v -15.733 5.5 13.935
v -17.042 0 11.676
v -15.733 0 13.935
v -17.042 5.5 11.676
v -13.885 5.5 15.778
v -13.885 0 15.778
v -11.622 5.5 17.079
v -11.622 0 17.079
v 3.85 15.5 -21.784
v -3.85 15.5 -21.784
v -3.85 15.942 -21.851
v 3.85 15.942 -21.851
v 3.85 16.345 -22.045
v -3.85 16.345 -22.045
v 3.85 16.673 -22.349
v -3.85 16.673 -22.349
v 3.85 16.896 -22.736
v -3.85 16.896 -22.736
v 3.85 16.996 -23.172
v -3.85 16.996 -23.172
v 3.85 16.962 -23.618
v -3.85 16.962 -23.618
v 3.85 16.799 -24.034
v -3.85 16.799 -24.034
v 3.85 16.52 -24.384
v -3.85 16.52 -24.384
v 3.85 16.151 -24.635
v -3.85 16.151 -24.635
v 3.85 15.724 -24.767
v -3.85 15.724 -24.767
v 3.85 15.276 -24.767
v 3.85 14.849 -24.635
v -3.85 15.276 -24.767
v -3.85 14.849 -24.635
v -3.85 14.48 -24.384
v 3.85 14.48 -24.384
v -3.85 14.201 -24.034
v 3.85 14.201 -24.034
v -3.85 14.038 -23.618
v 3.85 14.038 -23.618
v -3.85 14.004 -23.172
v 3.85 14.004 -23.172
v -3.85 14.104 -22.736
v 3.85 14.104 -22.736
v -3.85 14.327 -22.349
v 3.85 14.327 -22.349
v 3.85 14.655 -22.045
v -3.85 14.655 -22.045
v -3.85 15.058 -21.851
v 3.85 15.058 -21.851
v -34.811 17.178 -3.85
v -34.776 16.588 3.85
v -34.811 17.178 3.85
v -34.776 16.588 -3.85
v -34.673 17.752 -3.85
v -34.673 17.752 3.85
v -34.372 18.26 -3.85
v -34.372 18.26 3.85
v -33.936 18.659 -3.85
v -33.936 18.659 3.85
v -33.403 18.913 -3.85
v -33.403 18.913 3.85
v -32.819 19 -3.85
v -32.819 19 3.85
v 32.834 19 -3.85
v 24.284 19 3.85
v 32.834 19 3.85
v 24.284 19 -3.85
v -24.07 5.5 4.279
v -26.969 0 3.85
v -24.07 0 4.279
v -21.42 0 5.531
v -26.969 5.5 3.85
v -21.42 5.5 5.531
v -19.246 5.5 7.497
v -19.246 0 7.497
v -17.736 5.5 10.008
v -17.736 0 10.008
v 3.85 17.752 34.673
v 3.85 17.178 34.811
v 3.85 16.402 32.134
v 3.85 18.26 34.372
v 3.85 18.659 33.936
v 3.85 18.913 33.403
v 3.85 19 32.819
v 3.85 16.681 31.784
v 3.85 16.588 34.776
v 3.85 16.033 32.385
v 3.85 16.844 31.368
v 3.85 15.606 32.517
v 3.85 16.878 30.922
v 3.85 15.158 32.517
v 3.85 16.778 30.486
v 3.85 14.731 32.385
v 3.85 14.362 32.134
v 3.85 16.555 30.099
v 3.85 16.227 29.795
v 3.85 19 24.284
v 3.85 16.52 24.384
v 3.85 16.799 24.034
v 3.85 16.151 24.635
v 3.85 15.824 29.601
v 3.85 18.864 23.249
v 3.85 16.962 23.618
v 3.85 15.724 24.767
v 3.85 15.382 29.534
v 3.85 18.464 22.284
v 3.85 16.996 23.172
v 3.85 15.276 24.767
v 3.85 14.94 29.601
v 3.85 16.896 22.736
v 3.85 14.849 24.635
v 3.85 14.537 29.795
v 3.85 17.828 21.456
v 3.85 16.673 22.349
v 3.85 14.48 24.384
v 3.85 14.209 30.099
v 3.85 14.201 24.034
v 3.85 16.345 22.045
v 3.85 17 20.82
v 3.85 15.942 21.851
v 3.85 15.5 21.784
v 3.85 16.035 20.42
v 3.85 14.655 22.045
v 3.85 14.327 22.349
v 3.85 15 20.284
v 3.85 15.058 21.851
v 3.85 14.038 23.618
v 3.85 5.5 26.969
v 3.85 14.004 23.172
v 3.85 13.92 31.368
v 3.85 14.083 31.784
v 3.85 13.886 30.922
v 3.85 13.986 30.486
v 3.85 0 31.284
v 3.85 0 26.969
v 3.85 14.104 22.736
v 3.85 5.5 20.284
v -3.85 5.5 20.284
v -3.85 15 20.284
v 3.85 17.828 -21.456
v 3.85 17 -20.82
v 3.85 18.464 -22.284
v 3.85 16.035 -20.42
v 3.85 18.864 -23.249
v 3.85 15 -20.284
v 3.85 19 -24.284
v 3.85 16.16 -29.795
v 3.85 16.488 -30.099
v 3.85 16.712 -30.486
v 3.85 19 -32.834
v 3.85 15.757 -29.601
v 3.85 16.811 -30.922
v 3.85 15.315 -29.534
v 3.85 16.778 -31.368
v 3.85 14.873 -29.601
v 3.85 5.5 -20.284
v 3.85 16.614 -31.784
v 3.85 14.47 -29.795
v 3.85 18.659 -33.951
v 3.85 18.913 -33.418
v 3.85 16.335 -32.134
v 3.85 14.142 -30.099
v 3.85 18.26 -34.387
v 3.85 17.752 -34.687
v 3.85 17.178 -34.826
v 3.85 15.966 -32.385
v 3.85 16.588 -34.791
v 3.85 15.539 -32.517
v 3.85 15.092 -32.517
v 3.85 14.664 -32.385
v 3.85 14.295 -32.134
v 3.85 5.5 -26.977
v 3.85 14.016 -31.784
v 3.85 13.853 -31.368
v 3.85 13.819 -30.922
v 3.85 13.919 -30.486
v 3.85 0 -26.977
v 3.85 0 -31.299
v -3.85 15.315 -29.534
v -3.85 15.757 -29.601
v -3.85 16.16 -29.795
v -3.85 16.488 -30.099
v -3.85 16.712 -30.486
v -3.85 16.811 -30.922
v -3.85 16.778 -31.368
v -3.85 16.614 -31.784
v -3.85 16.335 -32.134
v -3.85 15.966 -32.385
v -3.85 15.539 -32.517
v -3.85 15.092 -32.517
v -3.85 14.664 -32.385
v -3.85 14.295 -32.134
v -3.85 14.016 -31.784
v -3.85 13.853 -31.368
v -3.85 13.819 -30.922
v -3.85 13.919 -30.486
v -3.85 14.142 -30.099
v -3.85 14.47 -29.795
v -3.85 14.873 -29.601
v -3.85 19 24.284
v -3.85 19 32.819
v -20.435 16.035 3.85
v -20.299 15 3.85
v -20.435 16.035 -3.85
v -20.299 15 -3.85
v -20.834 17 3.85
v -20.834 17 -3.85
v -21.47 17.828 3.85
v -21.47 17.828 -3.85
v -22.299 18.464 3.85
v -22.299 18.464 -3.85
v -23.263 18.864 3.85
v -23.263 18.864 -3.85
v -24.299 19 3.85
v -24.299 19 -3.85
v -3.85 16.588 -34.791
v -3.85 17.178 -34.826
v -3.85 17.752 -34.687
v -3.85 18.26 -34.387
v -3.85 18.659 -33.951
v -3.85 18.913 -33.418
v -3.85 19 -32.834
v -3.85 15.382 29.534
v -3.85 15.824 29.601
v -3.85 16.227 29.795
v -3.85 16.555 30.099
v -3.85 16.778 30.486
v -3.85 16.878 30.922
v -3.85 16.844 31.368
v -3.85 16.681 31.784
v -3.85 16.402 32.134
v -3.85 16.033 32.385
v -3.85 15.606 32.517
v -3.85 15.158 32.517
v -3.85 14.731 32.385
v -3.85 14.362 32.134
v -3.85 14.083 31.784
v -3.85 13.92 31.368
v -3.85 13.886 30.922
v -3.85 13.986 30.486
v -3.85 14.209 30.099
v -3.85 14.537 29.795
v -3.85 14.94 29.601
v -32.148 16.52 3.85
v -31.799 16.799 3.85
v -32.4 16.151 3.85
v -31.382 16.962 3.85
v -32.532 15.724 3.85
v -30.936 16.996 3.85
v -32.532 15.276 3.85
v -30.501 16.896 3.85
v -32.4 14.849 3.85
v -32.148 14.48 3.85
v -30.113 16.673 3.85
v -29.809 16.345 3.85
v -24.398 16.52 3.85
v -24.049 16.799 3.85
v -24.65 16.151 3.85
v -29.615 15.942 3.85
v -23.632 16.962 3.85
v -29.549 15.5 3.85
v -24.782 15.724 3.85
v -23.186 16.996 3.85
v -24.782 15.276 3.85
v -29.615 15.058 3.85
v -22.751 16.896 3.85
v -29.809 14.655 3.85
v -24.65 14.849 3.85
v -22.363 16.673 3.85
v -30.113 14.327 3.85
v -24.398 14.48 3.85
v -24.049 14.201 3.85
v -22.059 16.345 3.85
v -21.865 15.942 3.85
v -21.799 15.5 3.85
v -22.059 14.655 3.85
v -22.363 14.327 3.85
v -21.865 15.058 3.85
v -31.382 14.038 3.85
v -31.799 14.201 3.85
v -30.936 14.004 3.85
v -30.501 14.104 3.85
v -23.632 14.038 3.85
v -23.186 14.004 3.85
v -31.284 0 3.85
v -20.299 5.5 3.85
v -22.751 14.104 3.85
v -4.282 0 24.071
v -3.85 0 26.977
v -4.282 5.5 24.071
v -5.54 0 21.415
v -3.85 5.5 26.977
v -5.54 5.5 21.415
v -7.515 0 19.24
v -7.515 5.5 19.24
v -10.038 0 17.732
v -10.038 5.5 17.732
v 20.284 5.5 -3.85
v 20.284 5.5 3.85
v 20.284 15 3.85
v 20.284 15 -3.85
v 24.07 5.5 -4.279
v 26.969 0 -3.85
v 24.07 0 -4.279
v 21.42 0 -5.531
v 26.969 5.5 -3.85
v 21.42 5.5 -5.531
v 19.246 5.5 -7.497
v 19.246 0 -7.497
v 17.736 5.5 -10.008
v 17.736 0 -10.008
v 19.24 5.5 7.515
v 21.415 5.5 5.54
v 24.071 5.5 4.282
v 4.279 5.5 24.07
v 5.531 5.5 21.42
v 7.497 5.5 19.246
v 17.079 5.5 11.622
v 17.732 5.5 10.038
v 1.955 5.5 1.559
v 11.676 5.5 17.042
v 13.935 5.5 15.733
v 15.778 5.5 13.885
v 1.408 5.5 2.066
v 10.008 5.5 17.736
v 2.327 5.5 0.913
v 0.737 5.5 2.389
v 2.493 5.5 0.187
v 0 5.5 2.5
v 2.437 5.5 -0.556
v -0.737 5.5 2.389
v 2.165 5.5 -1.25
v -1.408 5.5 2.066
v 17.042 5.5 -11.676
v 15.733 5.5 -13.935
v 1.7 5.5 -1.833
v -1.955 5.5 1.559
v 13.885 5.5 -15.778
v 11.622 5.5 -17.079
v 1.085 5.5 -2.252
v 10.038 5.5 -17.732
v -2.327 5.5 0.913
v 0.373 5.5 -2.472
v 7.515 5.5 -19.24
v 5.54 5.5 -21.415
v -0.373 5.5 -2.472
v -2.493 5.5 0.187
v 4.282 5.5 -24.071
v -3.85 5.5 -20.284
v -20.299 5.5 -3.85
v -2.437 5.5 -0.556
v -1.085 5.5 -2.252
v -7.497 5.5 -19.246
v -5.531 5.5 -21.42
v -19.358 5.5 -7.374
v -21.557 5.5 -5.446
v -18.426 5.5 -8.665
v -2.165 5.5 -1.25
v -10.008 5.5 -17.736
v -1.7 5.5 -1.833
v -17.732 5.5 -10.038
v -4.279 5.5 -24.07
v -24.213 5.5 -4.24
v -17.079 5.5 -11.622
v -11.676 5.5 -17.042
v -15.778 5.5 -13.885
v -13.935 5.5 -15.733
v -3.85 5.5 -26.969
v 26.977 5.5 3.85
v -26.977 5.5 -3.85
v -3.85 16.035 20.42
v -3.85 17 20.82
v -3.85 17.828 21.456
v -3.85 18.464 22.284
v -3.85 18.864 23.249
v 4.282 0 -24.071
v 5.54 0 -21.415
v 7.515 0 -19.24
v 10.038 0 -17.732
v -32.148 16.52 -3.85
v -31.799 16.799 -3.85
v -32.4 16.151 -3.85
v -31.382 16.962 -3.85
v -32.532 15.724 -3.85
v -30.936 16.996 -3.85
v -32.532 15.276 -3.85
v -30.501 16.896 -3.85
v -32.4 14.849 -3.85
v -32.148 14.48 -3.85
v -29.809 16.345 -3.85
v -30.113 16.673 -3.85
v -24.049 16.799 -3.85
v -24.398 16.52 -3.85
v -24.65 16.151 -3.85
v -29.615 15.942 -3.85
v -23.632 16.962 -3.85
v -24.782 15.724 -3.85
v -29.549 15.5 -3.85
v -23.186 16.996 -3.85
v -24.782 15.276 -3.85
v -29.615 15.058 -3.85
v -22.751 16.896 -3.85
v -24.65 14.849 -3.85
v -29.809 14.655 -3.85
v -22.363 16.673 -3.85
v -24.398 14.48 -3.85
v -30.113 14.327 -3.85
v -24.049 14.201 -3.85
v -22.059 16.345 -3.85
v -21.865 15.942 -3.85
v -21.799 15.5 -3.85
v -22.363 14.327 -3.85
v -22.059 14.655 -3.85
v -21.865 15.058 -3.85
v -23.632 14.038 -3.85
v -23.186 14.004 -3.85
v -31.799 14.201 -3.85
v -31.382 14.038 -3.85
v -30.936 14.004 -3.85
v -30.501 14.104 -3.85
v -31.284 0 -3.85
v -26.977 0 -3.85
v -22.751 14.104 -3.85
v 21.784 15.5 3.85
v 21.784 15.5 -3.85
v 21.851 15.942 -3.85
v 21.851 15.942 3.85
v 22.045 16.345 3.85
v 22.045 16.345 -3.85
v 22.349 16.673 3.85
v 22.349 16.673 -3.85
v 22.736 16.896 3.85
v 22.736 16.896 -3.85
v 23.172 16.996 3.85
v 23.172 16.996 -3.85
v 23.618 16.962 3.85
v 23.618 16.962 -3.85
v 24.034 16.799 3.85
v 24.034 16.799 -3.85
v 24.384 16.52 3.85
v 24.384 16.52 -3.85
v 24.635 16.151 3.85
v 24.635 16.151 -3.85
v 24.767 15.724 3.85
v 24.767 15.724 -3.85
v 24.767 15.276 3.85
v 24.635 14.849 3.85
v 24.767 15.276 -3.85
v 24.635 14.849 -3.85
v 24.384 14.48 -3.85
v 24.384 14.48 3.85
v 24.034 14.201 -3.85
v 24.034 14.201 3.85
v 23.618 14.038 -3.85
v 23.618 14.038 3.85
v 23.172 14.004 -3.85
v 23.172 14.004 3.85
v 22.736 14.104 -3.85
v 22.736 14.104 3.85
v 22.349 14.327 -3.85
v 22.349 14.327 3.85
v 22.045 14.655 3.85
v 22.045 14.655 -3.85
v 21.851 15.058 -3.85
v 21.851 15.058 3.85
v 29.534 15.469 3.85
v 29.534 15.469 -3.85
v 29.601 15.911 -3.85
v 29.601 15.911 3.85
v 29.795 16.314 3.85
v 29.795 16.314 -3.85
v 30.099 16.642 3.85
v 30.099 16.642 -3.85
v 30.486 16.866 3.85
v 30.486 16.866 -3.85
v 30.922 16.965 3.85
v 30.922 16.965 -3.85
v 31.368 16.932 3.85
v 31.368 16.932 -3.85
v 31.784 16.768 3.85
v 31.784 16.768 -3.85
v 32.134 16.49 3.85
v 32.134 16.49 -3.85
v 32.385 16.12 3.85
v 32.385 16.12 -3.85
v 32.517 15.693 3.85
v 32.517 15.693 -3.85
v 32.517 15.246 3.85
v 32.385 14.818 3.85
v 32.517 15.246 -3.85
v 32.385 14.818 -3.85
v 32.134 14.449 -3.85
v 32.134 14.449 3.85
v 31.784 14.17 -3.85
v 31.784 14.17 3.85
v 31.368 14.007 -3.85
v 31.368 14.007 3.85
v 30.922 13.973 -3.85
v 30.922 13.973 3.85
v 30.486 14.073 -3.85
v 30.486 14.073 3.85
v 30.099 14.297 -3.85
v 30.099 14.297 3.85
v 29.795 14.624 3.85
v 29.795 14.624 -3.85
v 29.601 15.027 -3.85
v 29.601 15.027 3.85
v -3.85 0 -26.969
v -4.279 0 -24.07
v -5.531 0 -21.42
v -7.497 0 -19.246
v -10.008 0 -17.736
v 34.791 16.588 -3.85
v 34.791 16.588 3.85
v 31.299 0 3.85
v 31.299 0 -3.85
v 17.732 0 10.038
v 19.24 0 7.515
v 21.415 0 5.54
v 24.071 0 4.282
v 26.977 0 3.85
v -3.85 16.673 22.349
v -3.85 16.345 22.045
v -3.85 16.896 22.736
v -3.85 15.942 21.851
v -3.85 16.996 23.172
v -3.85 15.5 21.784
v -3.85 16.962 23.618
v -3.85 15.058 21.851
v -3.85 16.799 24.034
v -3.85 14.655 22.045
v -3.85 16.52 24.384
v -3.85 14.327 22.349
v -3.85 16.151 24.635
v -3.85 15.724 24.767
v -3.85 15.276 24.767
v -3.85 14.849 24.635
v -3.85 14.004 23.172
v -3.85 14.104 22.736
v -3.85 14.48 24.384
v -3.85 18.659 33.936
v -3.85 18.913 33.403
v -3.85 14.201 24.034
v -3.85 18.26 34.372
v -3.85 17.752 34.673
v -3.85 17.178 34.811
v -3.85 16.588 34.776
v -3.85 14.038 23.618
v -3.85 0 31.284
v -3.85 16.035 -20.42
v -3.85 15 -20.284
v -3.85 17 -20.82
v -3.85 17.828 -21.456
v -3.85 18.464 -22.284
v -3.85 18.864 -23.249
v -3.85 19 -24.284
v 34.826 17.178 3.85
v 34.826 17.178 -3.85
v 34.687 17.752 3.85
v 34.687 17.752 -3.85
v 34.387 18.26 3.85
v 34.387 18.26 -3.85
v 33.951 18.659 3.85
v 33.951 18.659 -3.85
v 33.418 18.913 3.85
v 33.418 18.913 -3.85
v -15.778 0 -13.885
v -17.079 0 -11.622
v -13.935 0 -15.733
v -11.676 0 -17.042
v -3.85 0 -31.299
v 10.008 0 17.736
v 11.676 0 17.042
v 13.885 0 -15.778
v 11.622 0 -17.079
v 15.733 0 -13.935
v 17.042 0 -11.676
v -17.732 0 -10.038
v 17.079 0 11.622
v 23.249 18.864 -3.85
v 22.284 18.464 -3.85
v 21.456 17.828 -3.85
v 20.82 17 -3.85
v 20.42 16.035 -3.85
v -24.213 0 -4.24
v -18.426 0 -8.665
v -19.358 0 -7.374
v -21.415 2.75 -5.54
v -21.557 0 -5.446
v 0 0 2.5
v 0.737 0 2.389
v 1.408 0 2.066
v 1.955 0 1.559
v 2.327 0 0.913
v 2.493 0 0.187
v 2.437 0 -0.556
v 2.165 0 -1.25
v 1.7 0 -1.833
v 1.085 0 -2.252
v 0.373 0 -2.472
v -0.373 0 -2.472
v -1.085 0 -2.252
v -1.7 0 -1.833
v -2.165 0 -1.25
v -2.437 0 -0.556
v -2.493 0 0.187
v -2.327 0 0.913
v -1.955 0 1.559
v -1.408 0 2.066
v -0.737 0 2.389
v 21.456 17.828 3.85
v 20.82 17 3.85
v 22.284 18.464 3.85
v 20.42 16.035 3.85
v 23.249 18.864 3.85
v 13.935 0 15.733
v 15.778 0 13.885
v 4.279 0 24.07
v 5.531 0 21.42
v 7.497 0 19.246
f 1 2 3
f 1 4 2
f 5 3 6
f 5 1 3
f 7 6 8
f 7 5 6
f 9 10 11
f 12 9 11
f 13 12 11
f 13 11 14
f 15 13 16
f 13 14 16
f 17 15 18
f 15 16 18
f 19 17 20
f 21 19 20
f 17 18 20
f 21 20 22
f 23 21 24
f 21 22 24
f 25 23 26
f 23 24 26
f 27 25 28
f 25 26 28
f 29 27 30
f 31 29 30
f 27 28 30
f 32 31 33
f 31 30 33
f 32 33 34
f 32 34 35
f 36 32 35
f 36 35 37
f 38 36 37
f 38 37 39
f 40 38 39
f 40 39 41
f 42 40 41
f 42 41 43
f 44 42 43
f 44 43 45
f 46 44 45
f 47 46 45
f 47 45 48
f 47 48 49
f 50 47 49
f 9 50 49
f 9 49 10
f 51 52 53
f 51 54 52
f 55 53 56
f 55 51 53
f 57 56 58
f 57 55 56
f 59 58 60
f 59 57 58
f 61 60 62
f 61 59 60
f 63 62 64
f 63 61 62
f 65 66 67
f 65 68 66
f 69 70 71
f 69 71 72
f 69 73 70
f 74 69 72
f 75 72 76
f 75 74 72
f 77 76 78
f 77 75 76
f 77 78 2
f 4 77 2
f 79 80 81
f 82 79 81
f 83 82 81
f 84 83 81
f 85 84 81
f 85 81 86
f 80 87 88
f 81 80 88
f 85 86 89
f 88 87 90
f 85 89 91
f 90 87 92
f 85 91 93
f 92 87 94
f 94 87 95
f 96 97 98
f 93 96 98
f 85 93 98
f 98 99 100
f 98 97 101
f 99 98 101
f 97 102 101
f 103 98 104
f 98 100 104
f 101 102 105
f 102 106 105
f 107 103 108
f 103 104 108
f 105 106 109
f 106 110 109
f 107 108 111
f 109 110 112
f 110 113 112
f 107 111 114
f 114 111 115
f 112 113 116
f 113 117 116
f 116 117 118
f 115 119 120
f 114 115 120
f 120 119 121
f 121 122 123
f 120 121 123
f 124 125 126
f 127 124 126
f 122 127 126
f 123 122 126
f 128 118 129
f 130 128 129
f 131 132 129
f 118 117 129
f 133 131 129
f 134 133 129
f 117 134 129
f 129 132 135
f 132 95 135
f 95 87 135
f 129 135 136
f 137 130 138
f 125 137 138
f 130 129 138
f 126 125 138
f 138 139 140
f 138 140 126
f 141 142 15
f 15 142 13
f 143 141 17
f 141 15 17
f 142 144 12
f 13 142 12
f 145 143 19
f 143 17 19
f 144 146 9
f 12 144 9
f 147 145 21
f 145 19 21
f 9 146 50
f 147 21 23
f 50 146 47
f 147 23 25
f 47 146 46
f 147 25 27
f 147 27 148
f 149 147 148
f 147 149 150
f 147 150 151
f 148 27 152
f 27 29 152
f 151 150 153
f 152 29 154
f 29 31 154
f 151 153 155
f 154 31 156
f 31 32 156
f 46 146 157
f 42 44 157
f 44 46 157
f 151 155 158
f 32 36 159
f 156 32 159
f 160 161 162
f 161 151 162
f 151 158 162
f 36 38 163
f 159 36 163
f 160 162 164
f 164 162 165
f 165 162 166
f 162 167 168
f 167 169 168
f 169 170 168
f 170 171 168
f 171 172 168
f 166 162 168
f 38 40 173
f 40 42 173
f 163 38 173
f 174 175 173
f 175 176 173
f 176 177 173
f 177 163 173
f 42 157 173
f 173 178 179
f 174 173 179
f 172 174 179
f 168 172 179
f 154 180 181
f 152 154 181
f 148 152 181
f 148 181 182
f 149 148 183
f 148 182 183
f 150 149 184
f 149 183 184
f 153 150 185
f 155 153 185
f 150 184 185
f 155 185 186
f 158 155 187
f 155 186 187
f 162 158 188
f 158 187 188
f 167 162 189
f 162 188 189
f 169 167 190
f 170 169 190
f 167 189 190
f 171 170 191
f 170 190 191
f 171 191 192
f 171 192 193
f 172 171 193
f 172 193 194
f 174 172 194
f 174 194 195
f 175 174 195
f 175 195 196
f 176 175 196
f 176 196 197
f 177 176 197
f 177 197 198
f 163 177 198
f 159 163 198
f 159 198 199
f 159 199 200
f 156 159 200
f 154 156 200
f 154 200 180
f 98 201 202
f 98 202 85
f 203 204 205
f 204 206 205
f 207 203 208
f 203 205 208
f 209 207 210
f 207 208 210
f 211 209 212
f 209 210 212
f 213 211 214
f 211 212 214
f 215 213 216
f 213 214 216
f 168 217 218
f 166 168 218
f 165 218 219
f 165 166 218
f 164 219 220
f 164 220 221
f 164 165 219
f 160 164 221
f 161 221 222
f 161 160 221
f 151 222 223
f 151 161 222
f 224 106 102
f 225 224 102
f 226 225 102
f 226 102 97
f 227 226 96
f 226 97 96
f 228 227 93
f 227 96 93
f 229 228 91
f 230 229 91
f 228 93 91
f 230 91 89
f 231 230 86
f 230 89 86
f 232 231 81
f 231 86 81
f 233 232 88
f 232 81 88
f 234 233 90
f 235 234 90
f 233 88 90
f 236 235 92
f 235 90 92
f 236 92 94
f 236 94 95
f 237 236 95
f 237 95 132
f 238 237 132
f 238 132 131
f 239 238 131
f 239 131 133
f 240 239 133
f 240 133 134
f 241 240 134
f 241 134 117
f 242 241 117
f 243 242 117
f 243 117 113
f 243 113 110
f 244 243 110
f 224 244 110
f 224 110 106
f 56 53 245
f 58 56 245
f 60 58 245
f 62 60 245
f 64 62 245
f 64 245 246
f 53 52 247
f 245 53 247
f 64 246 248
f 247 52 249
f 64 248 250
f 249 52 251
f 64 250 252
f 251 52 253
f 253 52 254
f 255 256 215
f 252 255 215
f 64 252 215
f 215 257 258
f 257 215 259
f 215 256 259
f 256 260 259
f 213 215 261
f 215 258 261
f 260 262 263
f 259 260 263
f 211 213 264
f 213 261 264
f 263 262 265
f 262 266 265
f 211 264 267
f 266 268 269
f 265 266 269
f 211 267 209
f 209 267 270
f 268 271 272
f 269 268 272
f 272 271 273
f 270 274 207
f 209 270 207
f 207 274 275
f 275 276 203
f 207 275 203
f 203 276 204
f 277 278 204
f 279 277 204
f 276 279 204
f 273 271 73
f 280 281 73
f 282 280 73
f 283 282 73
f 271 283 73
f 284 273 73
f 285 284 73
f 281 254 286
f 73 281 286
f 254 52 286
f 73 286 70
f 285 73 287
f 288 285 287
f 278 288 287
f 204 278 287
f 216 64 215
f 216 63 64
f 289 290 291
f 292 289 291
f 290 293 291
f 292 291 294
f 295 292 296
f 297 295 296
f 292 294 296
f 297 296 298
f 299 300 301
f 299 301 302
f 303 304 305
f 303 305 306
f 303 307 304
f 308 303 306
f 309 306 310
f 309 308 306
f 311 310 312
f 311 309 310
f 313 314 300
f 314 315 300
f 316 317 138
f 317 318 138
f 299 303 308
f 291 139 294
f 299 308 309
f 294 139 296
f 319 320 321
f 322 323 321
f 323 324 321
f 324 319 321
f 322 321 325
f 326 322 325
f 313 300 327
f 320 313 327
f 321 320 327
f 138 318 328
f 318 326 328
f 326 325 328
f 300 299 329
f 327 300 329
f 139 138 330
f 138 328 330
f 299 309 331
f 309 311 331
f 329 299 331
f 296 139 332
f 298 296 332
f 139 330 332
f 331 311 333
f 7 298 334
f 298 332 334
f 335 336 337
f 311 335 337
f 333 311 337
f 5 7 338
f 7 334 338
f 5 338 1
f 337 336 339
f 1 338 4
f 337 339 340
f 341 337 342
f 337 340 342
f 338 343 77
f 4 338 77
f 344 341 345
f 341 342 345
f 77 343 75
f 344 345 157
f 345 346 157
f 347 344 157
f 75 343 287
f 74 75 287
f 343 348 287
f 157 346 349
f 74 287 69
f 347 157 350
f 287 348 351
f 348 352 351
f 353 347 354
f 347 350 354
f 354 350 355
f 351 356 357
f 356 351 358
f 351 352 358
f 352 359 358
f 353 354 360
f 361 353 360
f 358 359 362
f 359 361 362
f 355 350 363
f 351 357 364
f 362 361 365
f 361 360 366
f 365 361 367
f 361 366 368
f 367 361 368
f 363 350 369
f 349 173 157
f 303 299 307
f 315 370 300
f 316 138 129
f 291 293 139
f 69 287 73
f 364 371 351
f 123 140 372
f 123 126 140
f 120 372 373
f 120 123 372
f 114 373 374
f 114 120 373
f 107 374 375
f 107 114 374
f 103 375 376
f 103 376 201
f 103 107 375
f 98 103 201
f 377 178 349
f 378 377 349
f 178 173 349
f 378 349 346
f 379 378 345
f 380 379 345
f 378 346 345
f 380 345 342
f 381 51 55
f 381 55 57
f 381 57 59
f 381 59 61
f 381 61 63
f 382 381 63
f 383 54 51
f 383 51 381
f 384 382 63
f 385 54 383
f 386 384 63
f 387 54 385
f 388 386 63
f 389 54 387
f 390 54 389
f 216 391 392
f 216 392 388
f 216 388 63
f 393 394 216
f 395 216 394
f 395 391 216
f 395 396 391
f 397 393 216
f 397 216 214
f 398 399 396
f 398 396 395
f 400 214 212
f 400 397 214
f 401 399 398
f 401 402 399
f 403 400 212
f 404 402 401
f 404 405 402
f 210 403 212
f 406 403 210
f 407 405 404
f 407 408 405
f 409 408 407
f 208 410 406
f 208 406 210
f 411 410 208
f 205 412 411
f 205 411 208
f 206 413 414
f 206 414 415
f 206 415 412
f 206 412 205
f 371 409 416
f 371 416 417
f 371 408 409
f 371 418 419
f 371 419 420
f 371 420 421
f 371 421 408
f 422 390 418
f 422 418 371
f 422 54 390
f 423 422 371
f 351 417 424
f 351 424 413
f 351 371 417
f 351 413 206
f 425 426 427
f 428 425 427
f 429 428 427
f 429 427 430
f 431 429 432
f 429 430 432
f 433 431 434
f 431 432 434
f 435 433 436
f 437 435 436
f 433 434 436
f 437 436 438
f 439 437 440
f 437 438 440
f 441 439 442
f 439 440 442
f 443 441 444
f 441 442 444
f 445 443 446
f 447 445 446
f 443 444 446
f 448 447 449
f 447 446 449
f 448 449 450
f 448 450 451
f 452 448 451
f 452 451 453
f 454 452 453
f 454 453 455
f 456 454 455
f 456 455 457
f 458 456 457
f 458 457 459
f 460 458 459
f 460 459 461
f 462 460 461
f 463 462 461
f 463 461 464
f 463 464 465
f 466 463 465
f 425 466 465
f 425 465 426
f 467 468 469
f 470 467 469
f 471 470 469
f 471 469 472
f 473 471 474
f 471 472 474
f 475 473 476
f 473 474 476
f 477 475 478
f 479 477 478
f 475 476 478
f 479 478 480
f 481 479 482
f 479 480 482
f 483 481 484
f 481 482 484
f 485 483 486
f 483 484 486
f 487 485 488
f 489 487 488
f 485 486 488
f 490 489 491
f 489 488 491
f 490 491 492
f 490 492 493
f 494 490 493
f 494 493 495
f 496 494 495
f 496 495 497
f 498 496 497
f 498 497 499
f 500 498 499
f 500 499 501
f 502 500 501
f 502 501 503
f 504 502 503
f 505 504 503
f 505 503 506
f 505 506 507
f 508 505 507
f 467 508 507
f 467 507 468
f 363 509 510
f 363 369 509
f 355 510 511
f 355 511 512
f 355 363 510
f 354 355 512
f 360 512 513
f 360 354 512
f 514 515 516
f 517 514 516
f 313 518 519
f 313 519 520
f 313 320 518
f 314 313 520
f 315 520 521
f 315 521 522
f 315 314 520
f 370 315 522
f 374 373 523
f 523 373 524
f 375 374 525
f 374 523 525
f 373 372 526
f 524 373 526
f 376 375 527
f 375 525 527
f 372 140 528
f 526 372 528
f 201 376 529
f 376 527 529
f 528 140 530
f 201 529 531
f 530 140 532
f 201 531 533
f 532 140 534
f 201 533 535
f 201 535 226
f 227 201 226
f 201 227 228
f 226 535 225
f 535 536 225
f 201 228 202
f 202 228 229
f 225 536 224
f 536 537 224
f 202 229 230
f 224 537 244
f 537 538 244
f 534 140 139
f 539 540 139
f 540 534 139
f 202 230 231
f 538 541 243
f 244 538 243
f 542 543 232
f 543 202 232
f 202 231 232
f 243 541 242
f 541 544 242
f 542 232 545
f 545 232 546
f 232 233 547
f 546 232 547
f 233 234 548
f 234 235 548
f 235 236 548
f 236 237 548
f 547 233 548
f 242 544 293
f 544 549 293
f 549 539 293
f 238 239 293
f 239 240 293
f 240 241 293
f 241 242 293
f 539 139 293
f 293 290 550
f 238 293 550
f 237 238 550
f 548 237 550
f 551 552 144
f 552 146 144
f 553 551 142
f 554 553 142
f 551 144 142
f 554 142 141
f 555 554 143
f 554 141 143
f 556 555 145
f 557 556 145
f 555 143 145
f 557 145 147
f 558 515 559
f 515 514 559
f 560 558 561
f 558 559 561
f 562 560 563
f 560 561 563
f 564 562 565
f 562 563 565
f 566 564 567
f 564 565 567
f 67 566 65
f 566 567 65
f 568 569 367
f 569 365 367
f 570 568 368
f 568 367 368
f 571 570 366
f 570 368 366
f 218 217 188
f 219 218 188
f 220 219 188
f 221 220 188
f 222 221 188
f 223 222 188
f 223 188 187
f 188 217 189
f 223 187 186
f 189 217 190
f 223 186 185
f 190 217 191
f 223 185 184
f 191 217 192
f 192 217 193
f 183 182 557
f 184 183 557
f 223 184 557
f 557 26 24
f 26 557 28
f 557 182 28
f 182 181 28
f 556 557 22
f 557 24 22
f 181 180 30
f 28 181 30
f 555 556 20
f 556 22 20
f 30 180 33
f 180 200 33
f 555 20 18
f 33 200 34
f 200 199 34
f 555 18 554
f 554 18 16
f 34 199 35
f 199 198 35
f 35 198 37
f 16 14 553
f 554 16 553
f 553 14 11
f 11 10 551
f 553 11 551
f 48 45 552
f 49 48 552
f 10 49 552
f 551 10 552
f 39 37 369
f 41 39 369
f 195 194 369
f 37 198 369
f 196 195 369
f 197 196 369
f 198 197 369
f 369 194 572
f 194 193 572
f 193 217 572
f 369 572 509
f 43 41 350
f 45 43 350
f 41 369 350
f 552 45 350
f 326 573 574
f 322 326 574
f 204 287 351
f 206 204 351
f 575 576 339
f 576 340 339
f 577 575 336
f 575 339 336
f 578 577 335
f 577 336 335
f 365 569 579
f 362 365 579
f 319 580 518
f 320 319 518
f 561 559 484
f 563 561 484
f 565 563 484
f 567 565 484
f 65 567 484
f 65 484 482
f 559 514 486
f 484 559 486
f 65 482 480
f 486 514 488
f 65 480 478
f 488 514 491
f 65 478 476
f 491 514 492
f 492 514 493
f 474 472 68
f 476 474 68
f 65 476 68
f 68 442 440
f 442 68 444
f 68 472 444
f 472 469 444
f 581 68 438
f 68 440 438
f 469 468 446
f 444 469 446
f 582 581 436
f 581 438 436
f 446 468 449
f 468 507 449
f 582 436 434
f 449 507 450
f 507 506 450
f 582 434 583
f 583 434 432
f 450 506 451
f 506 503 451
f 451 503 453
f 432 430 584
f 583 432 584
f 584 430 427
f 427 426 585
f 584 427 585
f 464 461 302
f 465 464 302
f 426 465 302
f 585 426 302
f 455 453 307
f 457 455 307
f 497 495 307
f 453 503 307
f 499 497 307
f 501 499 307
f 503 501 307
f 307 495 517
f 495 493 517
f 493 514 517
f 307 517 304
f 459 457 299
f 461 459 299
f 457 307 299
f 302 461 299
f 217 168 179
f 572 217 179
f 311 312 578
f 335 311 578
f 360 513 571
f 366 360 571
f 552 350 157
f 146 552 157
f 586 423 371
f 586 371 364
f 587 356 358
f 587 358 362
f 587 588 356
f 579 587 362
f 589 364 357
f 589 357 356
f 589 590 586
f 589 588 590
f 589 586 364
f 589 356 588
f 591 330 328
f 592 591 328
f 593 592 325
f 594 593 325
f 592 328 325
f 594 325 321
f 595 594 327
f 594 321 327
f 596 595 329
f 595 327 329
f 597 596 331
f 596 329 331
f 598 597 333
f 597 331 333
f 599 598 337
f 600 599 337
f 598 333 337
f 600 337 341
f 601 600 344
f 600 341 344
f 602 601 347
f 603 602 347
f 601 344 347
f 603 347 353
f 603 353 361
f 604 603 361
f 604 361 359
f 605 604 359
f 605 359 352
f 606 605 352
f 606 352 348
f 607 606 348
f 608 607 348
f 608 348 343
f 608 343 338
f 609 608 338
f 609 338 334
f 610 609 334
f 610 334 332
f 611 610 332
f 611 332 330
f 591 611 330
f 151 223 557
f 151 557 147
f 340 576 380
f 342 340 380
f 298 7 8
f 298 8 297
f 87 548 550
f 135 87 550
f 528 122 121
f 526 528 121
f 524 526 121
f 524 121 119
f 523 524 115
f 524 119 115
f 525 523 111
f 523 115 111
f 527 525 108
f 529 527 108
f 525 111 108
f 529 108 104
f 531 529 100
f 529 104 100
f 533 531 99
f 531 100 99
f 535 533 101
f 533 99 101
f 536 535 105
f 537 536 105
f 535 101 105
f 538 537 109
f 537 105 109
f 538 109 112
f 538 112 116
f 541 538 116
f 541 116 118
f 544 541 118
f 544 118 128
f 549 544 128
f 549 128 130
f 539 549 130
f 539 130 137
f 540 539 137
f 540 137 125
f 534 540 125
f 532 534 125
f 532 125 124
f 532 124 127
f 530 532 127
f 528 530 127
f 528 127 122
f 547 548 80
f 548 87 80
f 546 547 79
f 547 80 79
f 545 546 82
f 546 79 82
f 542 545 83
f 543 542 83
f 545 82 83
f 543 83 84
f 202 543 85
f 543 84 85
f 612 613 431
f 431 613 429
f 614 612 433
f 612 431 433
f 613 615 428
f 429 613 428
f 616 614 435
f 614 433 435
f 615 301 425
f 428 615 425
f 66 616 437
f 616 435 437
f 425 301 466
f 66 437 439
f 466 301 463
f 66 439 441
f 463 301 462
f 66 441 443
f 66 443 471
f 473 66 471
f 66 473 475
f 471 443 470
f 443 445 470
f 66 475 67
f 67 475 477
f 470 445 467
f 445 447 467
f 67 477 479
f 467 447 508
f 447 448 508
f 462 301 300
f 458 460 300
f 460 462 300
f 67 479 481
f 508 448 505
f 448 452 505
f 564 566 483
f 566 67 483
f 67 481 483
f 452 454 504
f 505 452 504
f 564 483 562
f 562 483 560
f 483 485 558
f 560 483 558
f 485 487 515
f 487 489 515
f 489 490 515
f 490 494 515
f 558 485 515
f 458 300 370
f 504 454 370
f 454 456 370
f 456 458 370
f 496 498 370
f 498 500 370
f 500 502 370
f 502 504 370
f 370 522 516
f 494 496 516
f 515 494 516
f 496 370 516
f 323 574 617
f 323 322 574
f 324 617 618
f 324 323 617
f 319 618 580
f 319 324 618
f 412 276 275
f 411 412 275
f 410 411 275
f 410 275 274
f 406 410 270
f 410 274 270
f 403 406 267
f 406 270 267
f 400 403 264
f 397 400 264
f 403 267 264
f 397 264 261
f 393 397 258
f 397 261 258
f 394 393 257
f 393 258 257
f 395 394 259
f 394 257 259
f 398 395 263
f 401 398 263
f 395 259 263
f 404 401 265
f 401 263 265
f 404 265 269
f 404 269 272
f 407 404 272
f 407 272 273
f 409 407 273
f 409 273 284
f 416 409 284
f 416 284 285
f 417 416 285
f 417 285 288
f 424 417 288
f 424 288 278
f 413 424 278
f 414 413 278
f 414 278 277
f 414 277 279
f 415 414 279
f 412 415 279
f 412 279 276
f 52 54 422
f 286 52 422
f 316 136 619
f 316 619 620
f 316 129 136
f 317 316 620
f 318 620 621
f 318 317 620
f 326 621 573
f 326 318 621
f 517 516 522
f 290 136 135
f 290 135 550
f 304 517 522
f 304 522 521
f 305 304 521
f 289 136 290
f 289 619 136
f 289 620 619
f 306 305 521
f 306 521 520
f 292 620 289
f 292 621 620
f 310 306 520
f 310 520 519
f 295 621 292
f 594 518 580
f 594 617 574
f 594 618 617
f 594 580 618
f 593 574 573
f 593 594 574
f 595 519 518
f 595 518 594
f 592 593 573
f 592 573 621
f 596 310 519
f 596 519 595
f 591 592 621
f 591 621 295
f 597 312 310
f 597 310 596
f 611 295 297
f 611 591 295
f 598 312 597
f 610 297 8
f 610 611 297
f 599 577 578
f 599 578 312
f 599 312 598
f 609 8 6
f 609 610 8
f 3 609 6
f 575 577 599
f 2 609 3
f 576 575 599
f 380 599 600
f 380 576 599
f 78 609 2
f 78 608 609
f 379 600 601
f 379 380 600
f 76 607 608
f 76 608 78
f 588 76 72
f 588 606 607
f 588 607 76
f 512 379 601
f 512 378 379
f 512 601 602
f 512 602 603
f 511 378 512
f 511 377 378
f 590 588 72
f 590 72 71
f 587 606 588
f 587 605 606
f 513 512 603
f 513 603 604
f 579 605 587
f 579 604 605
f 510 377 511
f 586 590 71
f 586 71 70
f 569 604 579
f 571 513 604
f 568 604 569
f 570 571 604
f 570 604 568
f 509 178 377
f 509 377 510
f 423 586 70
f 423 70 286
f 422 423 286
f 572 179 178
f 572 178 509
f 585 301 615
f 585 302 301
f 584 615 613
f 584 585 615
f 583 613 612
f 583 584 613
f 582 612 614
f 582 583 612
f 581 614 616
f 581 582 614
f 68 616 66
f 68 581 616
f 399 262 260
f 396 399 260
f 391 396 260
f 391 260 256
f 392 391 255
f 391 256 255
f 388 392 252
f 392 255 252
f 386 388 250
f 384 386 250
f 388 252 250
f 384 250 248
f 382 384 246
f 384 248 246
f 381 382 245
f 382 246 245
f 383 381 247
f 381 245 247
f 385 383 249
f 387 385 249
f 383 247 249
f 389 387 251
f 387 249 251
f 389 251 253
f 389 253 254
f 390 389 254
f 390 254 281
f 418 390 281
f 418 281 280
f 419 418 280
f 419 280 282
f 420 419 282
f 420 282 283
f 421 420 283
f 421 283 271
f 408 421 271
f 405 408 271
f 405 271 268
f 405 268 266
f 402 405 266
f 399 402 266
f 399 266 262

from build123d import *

# Parameters (mm, degrees)
BOSS_EXTRUSION_DEPTH     = 5.5
SCHIZZO2_W               = 14.985516936
SCHIZZO2_H               = 7.7
SCHIZZO2_W_2             = 7.7
SCHIZZO2_H_2             = 15.014483064
SCHIZZO2_W_3             = 15.014483064
SCHIZZO2_H_3             = 15
EXTERNAL_EXTRUSION_DEPTH = 13.5
SCHIZZO3_R               = 2.5
CETRAL_HOLE_DEPTH        = 52.71287379
TAGLIO_ESTRUSIONE2_DEPTH = 57.032066134
TAGLIO_ESTRUSIONE3_DEPTH = 57.021948056
TAGLIO_ESTRUSIONE4_DEPTH = 57.021948056
TAGLIO_ESTRUSIONE5_DEPTH = 57.032066134
FORO_PER_VITE_M4_1_D     = 3
FORO_PER_VITE_M4_2_D     = 3
FORO_PER_VITE_M4_3_D     = 3
FORO_PER_VITE_M4_4_D     = 3
RACCORDO1_R              = 4
RACCORDO2_R              = 4
RACCORDO3_R              = 4
RACCORDO4_R              = 4
RACCORDO5_R              = 2
RACCORDO6_R              = 2
RACCORDO7_R              = 2
RACCORDO8_R              = 2
RACCORDO9_R              = 10
RACCORDO17_R             = 10
RACCORDO18_R             = 10
RACCORDO19_R             = 10
RACCORDO20_R             = 10
RACCORDO21_R             = 10
RACCORDO22_DEPTH         = 5.5
RACCORDO23_R             = 10
RACCORDO24_R             = 10
RACCORDO25_R             = 10


with BuildPart() as part:
    # Schizzo1 → Boss extrusion (new body)
    with BuildSketch(Plane(origin=(0, 0, 0), x_dir=(1, 0, 0), z_dir=(0, 1, 0))):
        Polygon((-3.85, -20.28403897), (-3.85, -35.28403897), (3.85, -35.28403897), (3.85, -20.298522034), (15.500302101, -15.451094793), (20.28403897, -3.85), (35.298522034, -3.85), (35.298522034, 3.85), (20.298522034, 3.85), (15.451094793, 15.500302101), (3.85, 20.28403897), (3.85, 35.298522034), (-3.85, 35.298522034), (-3.85, 20.298522034), (-15.500302101, 15.451094793), (-20.28403897, 3.85), (-35.28403897, 3.85), (-35.28403897, -3.85), (-20.298522034, -3.85), (-15.451094793, -15.500302101), align=None)
    extrude(amount=BOSS_EXTRUSION_DEPTH)

    # Schizzo2 → external extrusion (add)
    with BuildSketch(Plane(origin=(0, 5.5, 0), x_dir=(1, 0, 0), z_dir=(0, 1, 0))):
        with Locations((-27.791280502, 0)):
            Rectangle(SCHIZZO2_W, SCHIZZO2_H)
        with Locations((0, 27.791280502)):
            Rectangle(SCHIZZO2_W_2, SCHIZZO2_H_2)
        with Locations((27.791280502, 0)):
            Rectangle(SCHIZZO2_W_3, SCHIZZO2_H)
        with Locations((0, -27.78403897)):
            Rectangle(SCHIZZO2_W_2, SCHIZZO2_H_3)
    extrude(amount=EXTERNAL_EXTRUSION_DEPTH)

    # Schizzo3 → cetral hole (cut, through all)
    with BuildSketch(Plane(origin=(0, 5.5, 0), x_dir=(1, 0, 0), z_dir=(0, 1, 0))):
        with Locations(Location((0, 0, 0), (0, 0, 270))):
            Circle(SCHIZZO3_R)
    extrude(amount=-CETRAL_HOLE_DEPTH, mode=Mode.SUBTRACT)

    # Schizzo4 → Taglio-Estrusione2 (cut, through all)
    with BuildSketch(Plane.XY.offset(3.85)):
        Polygon((35.298522034, 0), (35.298522034, 19), (31.298522034, 0), align=None)
    extrude(amount=-TAGLIO_ESTRUSIONE2_DEPTH, mode=Mode.SUBTRACT)

    # Schizzo5 → Taglio-Estrusione3 (cut, through all)
    with BuildSketch(Plane(origin=(3.85, 0, 0), x_dir=(0, 0, -1), z_dir=(1, 0, 0))):
        Polygon((35.298522034, 0), (35.298522034, 19), (31.298522034, 0), align=None)
    extrude(amount=-TAGLIO_ESTRUSIONE3_DEPTH, mode=Mode.SUBTRACT)

    # Schizzo8 → Taglio-Estrusione4 (cut, through all)
    with BuildSketch(Plane(origin=(0, 0, -3.85), x_dir=(-1, 0, 0), z_dir=(0, 0, -1))):
        Polygon((35.28403897, 0), (35.28403897, 19), (31.28403897, 0), align=None)
    extrude(amount=-TAGLIO_ESTRUSIONE4_DEPTH, mode=Mode.SUBTRACT)

    # Schizzo9 → Taglio-Estrusione5 (cut, through all)
    with BuildSketch(Plane.ZY.offset(3.85)):
        Polygon((35.28403897, 0), (35.28403897, 19), (31.28403897, 0), align=None)
    extrude(amount=-TAGLIO_ESTRUSIONE5_DEPTH, mode=Mode.SUBTRACT)

    # Foro per Vite M4-1 (through all)
    with Locations(Plane.ZY.offset(3.85)):
        with Locations((23.28403897, 15.5), (31.03403897, 15.381977535)):
            Hole(FORO_PER_VITE_M4_1_D / 2)

    # Foro per Vite M4-2 (through all)
    with Locations(Plane.XY.offset(3.85)):
        with Locations((23.28403897, 15.5), (31.03403897, 15.469257355)):
            Hole(FORO_PER_VITE_M4_2_D / 2)

    # Foro per Vite M4-3 (through all)
    with Locations(Plane(origin=(3.85, 0, 0), x_dir=(0, 0, -1), z_dir=(1, 0, 0))):
        with Locations((23.28403897, 15.5), (31.03403897, 15.315212004)):
            Hole(FORO_PER_VITE_M4_3_D / 2)

    # Foro per Vite M4-4 (through all)
    with Locations(Plane(origin=(0, 0, -3.85), x_dir=(-1, 0, 0), z_dir=(0, 0, -1))):
        with Locations((23.298522034, 15.5), (31.048522034, 15.5)):
            Hole(FORO_PER_VITE_M4_4_D / 2)

    # Raccordo1
    raccordo1_edges = [part.edges().sort_by_distance(p)[0] for p in [
        (20.28403897, 19, 0),
    ]]
    fillet(raccordo1_edges, radius=RACCORDO1_R)

    # Raccordo2
    raccordo2_edges = [part.edges().sort_by_distance(p)[0] for p in [
        (0, 19, -20.28403897),
    ]]
    fillet(raccordo2_edges, radius=RACCORDO2_R)

    # Raccordo3
    raccordo3_edges = [part.edges().sort_by_distance(p)[0] for p in [
        (-20.298522034, 19, 0),
    ]]
    fillet(raccordo3_edges, radius=RACCORDO3_R)

    # Raccordo4
    raccordo4_edges = [part.edges().sort_by_distance(p)[0] for p in [
        (0, 19, 20.28403897),
    ]]
    fillet(raccordo4_edges, radius=RACCORDO4_R)

    # Raccordo5
    raccordo5_edges = [part.edges().sort_by_distance(p)[0] for p in [
        (-35.28403897, 19, 0),
    ]]
    fillet(raccordo5_edges, radius=RACCORDO5_R)

    # Raccordo6
    raccordo6_edges = [part.edges().sort_by_distance(p)[0] for p in [
        (0, 19, -35.298522034),
    ]]
    fillet(raccordo6_edges, radius=RACCORDO6_R)

    # Raccordo7
    raccordo7_edges = [part.edges().sort_by_distance(p)[0] for p in [
        (35.298522034, 19, 0),
    ]]
    fillet(raccordo7_edges, radius=RACCORDO7_R)

    # Raccordo8
    raccordo8_edges = [part.edges().sort_by_distance(p)[0] for p in [
        (0, 19, 35.28403897),
    ]]
    fillet(raccordo8_edges, radius=RACCORDO8_R)

    # Raccordo9
    raccordo9_edges = [part.edges().sort_by_distance(p)[0] for p in [
        (3.85, 2.75, 20.298522034),
    ]]
    fillet(raccordo9_edges, radius=RACCORDO9_R)

    # Raccordo17
    raccordo17_edges = [part.edges().sort_by_distance(p)[0] for p in [
        (-3.85, 2.75, 20.28403897),
    ]]
    fillet(raccordo17_edges, radius=RACCORDO17_R)

    # Raccordo18
    raccordo18_edges = [part.edges().sort_by_distance(p)[0] for p in [
        (20.28403897, 2.75, 3.85),
    ]]
    fillet(raccordo18_edges, radius=RACCORDO18_R)

    # Raccordo19
    raccordo19_edges = [part.edges().sort_by_distance(p)[0] for p in [
        (20.298522034, 2.75, -3.85),
    ]]
    fillet(raccordo19_edges, radius=RACCORDO19_R)

    # Raccordo20
    raccordo20_edges = [part.edges().sort_by_distance(p)[0] for p in [
        (3.85, 2.75, -20.28403897),
    ]]
    fillet(raccordo20_edges, radius=RACCORDO20_R)

    # Raccordo21
    raccordo21_edges = [part.edges().sort_by_distance(p)[0] for p in [
        (-3.85, 2.75, -20.298522034),
    ]]
    fillet(raccordo21_edges, radius=RACCORDO21_R)

    # Raccordo22: read off the stored shape, not the designer's step
    # Raccordo22 outline → Raccordo22 (add)
    with BuildSketch(Plane(origin=(0, 0, 0), x_dir=(1, 0, 0), z_dir=(0, 1, 0))):
        with BuildLine():
            add(Edge.make_bspline(
                [(-26.977329566, 3.85), (-20.28403897, 3.85), (-17.732461927, 10.037858563)],
                knots=[0, 0, 0, 1, 1, 1], degree=2, weights=[1, 0.83102772, 1]))
            Line((-26.977329566, 3.85), (-20.28403897, 3.85))
            Line((-20.28403897, 3.85), (-17.732461927, 10.037858563))
        make_face()
    extrude(amount=RACCORDO22_DEPTH)

    # Raccordo23
    raccordo23_edges = [part.edges().sort_by_distance(p)[0] for p in [
        (-20.298522034, 2.75, 3.85),
    ]]
    fillet(raccordo23_edges, radius=RACCORDO23_R)

    # Raccordo24
    raccordo24_edges = [part.edges().sort_by_distance(p)[0] for p in [
        (-15.451094793, 2.75, 15.500302101),
    ]]
    fillet(raccordo24_edges, radius=RACCORDO24_R)

    # Raccordo25
    raccordo25_edges = [part.edges().sort_by_distance(p)[0] for p in [
        (-15.500302101, 2.75, -15.451094793),
        (15.451094793, 2.75, -15.500302101),
        (15.500302101, 2.75, 15.451094793),
    ]]
    fillet(raccordo25_edges, radius=RACCORDO25_R)


solid = part.part
